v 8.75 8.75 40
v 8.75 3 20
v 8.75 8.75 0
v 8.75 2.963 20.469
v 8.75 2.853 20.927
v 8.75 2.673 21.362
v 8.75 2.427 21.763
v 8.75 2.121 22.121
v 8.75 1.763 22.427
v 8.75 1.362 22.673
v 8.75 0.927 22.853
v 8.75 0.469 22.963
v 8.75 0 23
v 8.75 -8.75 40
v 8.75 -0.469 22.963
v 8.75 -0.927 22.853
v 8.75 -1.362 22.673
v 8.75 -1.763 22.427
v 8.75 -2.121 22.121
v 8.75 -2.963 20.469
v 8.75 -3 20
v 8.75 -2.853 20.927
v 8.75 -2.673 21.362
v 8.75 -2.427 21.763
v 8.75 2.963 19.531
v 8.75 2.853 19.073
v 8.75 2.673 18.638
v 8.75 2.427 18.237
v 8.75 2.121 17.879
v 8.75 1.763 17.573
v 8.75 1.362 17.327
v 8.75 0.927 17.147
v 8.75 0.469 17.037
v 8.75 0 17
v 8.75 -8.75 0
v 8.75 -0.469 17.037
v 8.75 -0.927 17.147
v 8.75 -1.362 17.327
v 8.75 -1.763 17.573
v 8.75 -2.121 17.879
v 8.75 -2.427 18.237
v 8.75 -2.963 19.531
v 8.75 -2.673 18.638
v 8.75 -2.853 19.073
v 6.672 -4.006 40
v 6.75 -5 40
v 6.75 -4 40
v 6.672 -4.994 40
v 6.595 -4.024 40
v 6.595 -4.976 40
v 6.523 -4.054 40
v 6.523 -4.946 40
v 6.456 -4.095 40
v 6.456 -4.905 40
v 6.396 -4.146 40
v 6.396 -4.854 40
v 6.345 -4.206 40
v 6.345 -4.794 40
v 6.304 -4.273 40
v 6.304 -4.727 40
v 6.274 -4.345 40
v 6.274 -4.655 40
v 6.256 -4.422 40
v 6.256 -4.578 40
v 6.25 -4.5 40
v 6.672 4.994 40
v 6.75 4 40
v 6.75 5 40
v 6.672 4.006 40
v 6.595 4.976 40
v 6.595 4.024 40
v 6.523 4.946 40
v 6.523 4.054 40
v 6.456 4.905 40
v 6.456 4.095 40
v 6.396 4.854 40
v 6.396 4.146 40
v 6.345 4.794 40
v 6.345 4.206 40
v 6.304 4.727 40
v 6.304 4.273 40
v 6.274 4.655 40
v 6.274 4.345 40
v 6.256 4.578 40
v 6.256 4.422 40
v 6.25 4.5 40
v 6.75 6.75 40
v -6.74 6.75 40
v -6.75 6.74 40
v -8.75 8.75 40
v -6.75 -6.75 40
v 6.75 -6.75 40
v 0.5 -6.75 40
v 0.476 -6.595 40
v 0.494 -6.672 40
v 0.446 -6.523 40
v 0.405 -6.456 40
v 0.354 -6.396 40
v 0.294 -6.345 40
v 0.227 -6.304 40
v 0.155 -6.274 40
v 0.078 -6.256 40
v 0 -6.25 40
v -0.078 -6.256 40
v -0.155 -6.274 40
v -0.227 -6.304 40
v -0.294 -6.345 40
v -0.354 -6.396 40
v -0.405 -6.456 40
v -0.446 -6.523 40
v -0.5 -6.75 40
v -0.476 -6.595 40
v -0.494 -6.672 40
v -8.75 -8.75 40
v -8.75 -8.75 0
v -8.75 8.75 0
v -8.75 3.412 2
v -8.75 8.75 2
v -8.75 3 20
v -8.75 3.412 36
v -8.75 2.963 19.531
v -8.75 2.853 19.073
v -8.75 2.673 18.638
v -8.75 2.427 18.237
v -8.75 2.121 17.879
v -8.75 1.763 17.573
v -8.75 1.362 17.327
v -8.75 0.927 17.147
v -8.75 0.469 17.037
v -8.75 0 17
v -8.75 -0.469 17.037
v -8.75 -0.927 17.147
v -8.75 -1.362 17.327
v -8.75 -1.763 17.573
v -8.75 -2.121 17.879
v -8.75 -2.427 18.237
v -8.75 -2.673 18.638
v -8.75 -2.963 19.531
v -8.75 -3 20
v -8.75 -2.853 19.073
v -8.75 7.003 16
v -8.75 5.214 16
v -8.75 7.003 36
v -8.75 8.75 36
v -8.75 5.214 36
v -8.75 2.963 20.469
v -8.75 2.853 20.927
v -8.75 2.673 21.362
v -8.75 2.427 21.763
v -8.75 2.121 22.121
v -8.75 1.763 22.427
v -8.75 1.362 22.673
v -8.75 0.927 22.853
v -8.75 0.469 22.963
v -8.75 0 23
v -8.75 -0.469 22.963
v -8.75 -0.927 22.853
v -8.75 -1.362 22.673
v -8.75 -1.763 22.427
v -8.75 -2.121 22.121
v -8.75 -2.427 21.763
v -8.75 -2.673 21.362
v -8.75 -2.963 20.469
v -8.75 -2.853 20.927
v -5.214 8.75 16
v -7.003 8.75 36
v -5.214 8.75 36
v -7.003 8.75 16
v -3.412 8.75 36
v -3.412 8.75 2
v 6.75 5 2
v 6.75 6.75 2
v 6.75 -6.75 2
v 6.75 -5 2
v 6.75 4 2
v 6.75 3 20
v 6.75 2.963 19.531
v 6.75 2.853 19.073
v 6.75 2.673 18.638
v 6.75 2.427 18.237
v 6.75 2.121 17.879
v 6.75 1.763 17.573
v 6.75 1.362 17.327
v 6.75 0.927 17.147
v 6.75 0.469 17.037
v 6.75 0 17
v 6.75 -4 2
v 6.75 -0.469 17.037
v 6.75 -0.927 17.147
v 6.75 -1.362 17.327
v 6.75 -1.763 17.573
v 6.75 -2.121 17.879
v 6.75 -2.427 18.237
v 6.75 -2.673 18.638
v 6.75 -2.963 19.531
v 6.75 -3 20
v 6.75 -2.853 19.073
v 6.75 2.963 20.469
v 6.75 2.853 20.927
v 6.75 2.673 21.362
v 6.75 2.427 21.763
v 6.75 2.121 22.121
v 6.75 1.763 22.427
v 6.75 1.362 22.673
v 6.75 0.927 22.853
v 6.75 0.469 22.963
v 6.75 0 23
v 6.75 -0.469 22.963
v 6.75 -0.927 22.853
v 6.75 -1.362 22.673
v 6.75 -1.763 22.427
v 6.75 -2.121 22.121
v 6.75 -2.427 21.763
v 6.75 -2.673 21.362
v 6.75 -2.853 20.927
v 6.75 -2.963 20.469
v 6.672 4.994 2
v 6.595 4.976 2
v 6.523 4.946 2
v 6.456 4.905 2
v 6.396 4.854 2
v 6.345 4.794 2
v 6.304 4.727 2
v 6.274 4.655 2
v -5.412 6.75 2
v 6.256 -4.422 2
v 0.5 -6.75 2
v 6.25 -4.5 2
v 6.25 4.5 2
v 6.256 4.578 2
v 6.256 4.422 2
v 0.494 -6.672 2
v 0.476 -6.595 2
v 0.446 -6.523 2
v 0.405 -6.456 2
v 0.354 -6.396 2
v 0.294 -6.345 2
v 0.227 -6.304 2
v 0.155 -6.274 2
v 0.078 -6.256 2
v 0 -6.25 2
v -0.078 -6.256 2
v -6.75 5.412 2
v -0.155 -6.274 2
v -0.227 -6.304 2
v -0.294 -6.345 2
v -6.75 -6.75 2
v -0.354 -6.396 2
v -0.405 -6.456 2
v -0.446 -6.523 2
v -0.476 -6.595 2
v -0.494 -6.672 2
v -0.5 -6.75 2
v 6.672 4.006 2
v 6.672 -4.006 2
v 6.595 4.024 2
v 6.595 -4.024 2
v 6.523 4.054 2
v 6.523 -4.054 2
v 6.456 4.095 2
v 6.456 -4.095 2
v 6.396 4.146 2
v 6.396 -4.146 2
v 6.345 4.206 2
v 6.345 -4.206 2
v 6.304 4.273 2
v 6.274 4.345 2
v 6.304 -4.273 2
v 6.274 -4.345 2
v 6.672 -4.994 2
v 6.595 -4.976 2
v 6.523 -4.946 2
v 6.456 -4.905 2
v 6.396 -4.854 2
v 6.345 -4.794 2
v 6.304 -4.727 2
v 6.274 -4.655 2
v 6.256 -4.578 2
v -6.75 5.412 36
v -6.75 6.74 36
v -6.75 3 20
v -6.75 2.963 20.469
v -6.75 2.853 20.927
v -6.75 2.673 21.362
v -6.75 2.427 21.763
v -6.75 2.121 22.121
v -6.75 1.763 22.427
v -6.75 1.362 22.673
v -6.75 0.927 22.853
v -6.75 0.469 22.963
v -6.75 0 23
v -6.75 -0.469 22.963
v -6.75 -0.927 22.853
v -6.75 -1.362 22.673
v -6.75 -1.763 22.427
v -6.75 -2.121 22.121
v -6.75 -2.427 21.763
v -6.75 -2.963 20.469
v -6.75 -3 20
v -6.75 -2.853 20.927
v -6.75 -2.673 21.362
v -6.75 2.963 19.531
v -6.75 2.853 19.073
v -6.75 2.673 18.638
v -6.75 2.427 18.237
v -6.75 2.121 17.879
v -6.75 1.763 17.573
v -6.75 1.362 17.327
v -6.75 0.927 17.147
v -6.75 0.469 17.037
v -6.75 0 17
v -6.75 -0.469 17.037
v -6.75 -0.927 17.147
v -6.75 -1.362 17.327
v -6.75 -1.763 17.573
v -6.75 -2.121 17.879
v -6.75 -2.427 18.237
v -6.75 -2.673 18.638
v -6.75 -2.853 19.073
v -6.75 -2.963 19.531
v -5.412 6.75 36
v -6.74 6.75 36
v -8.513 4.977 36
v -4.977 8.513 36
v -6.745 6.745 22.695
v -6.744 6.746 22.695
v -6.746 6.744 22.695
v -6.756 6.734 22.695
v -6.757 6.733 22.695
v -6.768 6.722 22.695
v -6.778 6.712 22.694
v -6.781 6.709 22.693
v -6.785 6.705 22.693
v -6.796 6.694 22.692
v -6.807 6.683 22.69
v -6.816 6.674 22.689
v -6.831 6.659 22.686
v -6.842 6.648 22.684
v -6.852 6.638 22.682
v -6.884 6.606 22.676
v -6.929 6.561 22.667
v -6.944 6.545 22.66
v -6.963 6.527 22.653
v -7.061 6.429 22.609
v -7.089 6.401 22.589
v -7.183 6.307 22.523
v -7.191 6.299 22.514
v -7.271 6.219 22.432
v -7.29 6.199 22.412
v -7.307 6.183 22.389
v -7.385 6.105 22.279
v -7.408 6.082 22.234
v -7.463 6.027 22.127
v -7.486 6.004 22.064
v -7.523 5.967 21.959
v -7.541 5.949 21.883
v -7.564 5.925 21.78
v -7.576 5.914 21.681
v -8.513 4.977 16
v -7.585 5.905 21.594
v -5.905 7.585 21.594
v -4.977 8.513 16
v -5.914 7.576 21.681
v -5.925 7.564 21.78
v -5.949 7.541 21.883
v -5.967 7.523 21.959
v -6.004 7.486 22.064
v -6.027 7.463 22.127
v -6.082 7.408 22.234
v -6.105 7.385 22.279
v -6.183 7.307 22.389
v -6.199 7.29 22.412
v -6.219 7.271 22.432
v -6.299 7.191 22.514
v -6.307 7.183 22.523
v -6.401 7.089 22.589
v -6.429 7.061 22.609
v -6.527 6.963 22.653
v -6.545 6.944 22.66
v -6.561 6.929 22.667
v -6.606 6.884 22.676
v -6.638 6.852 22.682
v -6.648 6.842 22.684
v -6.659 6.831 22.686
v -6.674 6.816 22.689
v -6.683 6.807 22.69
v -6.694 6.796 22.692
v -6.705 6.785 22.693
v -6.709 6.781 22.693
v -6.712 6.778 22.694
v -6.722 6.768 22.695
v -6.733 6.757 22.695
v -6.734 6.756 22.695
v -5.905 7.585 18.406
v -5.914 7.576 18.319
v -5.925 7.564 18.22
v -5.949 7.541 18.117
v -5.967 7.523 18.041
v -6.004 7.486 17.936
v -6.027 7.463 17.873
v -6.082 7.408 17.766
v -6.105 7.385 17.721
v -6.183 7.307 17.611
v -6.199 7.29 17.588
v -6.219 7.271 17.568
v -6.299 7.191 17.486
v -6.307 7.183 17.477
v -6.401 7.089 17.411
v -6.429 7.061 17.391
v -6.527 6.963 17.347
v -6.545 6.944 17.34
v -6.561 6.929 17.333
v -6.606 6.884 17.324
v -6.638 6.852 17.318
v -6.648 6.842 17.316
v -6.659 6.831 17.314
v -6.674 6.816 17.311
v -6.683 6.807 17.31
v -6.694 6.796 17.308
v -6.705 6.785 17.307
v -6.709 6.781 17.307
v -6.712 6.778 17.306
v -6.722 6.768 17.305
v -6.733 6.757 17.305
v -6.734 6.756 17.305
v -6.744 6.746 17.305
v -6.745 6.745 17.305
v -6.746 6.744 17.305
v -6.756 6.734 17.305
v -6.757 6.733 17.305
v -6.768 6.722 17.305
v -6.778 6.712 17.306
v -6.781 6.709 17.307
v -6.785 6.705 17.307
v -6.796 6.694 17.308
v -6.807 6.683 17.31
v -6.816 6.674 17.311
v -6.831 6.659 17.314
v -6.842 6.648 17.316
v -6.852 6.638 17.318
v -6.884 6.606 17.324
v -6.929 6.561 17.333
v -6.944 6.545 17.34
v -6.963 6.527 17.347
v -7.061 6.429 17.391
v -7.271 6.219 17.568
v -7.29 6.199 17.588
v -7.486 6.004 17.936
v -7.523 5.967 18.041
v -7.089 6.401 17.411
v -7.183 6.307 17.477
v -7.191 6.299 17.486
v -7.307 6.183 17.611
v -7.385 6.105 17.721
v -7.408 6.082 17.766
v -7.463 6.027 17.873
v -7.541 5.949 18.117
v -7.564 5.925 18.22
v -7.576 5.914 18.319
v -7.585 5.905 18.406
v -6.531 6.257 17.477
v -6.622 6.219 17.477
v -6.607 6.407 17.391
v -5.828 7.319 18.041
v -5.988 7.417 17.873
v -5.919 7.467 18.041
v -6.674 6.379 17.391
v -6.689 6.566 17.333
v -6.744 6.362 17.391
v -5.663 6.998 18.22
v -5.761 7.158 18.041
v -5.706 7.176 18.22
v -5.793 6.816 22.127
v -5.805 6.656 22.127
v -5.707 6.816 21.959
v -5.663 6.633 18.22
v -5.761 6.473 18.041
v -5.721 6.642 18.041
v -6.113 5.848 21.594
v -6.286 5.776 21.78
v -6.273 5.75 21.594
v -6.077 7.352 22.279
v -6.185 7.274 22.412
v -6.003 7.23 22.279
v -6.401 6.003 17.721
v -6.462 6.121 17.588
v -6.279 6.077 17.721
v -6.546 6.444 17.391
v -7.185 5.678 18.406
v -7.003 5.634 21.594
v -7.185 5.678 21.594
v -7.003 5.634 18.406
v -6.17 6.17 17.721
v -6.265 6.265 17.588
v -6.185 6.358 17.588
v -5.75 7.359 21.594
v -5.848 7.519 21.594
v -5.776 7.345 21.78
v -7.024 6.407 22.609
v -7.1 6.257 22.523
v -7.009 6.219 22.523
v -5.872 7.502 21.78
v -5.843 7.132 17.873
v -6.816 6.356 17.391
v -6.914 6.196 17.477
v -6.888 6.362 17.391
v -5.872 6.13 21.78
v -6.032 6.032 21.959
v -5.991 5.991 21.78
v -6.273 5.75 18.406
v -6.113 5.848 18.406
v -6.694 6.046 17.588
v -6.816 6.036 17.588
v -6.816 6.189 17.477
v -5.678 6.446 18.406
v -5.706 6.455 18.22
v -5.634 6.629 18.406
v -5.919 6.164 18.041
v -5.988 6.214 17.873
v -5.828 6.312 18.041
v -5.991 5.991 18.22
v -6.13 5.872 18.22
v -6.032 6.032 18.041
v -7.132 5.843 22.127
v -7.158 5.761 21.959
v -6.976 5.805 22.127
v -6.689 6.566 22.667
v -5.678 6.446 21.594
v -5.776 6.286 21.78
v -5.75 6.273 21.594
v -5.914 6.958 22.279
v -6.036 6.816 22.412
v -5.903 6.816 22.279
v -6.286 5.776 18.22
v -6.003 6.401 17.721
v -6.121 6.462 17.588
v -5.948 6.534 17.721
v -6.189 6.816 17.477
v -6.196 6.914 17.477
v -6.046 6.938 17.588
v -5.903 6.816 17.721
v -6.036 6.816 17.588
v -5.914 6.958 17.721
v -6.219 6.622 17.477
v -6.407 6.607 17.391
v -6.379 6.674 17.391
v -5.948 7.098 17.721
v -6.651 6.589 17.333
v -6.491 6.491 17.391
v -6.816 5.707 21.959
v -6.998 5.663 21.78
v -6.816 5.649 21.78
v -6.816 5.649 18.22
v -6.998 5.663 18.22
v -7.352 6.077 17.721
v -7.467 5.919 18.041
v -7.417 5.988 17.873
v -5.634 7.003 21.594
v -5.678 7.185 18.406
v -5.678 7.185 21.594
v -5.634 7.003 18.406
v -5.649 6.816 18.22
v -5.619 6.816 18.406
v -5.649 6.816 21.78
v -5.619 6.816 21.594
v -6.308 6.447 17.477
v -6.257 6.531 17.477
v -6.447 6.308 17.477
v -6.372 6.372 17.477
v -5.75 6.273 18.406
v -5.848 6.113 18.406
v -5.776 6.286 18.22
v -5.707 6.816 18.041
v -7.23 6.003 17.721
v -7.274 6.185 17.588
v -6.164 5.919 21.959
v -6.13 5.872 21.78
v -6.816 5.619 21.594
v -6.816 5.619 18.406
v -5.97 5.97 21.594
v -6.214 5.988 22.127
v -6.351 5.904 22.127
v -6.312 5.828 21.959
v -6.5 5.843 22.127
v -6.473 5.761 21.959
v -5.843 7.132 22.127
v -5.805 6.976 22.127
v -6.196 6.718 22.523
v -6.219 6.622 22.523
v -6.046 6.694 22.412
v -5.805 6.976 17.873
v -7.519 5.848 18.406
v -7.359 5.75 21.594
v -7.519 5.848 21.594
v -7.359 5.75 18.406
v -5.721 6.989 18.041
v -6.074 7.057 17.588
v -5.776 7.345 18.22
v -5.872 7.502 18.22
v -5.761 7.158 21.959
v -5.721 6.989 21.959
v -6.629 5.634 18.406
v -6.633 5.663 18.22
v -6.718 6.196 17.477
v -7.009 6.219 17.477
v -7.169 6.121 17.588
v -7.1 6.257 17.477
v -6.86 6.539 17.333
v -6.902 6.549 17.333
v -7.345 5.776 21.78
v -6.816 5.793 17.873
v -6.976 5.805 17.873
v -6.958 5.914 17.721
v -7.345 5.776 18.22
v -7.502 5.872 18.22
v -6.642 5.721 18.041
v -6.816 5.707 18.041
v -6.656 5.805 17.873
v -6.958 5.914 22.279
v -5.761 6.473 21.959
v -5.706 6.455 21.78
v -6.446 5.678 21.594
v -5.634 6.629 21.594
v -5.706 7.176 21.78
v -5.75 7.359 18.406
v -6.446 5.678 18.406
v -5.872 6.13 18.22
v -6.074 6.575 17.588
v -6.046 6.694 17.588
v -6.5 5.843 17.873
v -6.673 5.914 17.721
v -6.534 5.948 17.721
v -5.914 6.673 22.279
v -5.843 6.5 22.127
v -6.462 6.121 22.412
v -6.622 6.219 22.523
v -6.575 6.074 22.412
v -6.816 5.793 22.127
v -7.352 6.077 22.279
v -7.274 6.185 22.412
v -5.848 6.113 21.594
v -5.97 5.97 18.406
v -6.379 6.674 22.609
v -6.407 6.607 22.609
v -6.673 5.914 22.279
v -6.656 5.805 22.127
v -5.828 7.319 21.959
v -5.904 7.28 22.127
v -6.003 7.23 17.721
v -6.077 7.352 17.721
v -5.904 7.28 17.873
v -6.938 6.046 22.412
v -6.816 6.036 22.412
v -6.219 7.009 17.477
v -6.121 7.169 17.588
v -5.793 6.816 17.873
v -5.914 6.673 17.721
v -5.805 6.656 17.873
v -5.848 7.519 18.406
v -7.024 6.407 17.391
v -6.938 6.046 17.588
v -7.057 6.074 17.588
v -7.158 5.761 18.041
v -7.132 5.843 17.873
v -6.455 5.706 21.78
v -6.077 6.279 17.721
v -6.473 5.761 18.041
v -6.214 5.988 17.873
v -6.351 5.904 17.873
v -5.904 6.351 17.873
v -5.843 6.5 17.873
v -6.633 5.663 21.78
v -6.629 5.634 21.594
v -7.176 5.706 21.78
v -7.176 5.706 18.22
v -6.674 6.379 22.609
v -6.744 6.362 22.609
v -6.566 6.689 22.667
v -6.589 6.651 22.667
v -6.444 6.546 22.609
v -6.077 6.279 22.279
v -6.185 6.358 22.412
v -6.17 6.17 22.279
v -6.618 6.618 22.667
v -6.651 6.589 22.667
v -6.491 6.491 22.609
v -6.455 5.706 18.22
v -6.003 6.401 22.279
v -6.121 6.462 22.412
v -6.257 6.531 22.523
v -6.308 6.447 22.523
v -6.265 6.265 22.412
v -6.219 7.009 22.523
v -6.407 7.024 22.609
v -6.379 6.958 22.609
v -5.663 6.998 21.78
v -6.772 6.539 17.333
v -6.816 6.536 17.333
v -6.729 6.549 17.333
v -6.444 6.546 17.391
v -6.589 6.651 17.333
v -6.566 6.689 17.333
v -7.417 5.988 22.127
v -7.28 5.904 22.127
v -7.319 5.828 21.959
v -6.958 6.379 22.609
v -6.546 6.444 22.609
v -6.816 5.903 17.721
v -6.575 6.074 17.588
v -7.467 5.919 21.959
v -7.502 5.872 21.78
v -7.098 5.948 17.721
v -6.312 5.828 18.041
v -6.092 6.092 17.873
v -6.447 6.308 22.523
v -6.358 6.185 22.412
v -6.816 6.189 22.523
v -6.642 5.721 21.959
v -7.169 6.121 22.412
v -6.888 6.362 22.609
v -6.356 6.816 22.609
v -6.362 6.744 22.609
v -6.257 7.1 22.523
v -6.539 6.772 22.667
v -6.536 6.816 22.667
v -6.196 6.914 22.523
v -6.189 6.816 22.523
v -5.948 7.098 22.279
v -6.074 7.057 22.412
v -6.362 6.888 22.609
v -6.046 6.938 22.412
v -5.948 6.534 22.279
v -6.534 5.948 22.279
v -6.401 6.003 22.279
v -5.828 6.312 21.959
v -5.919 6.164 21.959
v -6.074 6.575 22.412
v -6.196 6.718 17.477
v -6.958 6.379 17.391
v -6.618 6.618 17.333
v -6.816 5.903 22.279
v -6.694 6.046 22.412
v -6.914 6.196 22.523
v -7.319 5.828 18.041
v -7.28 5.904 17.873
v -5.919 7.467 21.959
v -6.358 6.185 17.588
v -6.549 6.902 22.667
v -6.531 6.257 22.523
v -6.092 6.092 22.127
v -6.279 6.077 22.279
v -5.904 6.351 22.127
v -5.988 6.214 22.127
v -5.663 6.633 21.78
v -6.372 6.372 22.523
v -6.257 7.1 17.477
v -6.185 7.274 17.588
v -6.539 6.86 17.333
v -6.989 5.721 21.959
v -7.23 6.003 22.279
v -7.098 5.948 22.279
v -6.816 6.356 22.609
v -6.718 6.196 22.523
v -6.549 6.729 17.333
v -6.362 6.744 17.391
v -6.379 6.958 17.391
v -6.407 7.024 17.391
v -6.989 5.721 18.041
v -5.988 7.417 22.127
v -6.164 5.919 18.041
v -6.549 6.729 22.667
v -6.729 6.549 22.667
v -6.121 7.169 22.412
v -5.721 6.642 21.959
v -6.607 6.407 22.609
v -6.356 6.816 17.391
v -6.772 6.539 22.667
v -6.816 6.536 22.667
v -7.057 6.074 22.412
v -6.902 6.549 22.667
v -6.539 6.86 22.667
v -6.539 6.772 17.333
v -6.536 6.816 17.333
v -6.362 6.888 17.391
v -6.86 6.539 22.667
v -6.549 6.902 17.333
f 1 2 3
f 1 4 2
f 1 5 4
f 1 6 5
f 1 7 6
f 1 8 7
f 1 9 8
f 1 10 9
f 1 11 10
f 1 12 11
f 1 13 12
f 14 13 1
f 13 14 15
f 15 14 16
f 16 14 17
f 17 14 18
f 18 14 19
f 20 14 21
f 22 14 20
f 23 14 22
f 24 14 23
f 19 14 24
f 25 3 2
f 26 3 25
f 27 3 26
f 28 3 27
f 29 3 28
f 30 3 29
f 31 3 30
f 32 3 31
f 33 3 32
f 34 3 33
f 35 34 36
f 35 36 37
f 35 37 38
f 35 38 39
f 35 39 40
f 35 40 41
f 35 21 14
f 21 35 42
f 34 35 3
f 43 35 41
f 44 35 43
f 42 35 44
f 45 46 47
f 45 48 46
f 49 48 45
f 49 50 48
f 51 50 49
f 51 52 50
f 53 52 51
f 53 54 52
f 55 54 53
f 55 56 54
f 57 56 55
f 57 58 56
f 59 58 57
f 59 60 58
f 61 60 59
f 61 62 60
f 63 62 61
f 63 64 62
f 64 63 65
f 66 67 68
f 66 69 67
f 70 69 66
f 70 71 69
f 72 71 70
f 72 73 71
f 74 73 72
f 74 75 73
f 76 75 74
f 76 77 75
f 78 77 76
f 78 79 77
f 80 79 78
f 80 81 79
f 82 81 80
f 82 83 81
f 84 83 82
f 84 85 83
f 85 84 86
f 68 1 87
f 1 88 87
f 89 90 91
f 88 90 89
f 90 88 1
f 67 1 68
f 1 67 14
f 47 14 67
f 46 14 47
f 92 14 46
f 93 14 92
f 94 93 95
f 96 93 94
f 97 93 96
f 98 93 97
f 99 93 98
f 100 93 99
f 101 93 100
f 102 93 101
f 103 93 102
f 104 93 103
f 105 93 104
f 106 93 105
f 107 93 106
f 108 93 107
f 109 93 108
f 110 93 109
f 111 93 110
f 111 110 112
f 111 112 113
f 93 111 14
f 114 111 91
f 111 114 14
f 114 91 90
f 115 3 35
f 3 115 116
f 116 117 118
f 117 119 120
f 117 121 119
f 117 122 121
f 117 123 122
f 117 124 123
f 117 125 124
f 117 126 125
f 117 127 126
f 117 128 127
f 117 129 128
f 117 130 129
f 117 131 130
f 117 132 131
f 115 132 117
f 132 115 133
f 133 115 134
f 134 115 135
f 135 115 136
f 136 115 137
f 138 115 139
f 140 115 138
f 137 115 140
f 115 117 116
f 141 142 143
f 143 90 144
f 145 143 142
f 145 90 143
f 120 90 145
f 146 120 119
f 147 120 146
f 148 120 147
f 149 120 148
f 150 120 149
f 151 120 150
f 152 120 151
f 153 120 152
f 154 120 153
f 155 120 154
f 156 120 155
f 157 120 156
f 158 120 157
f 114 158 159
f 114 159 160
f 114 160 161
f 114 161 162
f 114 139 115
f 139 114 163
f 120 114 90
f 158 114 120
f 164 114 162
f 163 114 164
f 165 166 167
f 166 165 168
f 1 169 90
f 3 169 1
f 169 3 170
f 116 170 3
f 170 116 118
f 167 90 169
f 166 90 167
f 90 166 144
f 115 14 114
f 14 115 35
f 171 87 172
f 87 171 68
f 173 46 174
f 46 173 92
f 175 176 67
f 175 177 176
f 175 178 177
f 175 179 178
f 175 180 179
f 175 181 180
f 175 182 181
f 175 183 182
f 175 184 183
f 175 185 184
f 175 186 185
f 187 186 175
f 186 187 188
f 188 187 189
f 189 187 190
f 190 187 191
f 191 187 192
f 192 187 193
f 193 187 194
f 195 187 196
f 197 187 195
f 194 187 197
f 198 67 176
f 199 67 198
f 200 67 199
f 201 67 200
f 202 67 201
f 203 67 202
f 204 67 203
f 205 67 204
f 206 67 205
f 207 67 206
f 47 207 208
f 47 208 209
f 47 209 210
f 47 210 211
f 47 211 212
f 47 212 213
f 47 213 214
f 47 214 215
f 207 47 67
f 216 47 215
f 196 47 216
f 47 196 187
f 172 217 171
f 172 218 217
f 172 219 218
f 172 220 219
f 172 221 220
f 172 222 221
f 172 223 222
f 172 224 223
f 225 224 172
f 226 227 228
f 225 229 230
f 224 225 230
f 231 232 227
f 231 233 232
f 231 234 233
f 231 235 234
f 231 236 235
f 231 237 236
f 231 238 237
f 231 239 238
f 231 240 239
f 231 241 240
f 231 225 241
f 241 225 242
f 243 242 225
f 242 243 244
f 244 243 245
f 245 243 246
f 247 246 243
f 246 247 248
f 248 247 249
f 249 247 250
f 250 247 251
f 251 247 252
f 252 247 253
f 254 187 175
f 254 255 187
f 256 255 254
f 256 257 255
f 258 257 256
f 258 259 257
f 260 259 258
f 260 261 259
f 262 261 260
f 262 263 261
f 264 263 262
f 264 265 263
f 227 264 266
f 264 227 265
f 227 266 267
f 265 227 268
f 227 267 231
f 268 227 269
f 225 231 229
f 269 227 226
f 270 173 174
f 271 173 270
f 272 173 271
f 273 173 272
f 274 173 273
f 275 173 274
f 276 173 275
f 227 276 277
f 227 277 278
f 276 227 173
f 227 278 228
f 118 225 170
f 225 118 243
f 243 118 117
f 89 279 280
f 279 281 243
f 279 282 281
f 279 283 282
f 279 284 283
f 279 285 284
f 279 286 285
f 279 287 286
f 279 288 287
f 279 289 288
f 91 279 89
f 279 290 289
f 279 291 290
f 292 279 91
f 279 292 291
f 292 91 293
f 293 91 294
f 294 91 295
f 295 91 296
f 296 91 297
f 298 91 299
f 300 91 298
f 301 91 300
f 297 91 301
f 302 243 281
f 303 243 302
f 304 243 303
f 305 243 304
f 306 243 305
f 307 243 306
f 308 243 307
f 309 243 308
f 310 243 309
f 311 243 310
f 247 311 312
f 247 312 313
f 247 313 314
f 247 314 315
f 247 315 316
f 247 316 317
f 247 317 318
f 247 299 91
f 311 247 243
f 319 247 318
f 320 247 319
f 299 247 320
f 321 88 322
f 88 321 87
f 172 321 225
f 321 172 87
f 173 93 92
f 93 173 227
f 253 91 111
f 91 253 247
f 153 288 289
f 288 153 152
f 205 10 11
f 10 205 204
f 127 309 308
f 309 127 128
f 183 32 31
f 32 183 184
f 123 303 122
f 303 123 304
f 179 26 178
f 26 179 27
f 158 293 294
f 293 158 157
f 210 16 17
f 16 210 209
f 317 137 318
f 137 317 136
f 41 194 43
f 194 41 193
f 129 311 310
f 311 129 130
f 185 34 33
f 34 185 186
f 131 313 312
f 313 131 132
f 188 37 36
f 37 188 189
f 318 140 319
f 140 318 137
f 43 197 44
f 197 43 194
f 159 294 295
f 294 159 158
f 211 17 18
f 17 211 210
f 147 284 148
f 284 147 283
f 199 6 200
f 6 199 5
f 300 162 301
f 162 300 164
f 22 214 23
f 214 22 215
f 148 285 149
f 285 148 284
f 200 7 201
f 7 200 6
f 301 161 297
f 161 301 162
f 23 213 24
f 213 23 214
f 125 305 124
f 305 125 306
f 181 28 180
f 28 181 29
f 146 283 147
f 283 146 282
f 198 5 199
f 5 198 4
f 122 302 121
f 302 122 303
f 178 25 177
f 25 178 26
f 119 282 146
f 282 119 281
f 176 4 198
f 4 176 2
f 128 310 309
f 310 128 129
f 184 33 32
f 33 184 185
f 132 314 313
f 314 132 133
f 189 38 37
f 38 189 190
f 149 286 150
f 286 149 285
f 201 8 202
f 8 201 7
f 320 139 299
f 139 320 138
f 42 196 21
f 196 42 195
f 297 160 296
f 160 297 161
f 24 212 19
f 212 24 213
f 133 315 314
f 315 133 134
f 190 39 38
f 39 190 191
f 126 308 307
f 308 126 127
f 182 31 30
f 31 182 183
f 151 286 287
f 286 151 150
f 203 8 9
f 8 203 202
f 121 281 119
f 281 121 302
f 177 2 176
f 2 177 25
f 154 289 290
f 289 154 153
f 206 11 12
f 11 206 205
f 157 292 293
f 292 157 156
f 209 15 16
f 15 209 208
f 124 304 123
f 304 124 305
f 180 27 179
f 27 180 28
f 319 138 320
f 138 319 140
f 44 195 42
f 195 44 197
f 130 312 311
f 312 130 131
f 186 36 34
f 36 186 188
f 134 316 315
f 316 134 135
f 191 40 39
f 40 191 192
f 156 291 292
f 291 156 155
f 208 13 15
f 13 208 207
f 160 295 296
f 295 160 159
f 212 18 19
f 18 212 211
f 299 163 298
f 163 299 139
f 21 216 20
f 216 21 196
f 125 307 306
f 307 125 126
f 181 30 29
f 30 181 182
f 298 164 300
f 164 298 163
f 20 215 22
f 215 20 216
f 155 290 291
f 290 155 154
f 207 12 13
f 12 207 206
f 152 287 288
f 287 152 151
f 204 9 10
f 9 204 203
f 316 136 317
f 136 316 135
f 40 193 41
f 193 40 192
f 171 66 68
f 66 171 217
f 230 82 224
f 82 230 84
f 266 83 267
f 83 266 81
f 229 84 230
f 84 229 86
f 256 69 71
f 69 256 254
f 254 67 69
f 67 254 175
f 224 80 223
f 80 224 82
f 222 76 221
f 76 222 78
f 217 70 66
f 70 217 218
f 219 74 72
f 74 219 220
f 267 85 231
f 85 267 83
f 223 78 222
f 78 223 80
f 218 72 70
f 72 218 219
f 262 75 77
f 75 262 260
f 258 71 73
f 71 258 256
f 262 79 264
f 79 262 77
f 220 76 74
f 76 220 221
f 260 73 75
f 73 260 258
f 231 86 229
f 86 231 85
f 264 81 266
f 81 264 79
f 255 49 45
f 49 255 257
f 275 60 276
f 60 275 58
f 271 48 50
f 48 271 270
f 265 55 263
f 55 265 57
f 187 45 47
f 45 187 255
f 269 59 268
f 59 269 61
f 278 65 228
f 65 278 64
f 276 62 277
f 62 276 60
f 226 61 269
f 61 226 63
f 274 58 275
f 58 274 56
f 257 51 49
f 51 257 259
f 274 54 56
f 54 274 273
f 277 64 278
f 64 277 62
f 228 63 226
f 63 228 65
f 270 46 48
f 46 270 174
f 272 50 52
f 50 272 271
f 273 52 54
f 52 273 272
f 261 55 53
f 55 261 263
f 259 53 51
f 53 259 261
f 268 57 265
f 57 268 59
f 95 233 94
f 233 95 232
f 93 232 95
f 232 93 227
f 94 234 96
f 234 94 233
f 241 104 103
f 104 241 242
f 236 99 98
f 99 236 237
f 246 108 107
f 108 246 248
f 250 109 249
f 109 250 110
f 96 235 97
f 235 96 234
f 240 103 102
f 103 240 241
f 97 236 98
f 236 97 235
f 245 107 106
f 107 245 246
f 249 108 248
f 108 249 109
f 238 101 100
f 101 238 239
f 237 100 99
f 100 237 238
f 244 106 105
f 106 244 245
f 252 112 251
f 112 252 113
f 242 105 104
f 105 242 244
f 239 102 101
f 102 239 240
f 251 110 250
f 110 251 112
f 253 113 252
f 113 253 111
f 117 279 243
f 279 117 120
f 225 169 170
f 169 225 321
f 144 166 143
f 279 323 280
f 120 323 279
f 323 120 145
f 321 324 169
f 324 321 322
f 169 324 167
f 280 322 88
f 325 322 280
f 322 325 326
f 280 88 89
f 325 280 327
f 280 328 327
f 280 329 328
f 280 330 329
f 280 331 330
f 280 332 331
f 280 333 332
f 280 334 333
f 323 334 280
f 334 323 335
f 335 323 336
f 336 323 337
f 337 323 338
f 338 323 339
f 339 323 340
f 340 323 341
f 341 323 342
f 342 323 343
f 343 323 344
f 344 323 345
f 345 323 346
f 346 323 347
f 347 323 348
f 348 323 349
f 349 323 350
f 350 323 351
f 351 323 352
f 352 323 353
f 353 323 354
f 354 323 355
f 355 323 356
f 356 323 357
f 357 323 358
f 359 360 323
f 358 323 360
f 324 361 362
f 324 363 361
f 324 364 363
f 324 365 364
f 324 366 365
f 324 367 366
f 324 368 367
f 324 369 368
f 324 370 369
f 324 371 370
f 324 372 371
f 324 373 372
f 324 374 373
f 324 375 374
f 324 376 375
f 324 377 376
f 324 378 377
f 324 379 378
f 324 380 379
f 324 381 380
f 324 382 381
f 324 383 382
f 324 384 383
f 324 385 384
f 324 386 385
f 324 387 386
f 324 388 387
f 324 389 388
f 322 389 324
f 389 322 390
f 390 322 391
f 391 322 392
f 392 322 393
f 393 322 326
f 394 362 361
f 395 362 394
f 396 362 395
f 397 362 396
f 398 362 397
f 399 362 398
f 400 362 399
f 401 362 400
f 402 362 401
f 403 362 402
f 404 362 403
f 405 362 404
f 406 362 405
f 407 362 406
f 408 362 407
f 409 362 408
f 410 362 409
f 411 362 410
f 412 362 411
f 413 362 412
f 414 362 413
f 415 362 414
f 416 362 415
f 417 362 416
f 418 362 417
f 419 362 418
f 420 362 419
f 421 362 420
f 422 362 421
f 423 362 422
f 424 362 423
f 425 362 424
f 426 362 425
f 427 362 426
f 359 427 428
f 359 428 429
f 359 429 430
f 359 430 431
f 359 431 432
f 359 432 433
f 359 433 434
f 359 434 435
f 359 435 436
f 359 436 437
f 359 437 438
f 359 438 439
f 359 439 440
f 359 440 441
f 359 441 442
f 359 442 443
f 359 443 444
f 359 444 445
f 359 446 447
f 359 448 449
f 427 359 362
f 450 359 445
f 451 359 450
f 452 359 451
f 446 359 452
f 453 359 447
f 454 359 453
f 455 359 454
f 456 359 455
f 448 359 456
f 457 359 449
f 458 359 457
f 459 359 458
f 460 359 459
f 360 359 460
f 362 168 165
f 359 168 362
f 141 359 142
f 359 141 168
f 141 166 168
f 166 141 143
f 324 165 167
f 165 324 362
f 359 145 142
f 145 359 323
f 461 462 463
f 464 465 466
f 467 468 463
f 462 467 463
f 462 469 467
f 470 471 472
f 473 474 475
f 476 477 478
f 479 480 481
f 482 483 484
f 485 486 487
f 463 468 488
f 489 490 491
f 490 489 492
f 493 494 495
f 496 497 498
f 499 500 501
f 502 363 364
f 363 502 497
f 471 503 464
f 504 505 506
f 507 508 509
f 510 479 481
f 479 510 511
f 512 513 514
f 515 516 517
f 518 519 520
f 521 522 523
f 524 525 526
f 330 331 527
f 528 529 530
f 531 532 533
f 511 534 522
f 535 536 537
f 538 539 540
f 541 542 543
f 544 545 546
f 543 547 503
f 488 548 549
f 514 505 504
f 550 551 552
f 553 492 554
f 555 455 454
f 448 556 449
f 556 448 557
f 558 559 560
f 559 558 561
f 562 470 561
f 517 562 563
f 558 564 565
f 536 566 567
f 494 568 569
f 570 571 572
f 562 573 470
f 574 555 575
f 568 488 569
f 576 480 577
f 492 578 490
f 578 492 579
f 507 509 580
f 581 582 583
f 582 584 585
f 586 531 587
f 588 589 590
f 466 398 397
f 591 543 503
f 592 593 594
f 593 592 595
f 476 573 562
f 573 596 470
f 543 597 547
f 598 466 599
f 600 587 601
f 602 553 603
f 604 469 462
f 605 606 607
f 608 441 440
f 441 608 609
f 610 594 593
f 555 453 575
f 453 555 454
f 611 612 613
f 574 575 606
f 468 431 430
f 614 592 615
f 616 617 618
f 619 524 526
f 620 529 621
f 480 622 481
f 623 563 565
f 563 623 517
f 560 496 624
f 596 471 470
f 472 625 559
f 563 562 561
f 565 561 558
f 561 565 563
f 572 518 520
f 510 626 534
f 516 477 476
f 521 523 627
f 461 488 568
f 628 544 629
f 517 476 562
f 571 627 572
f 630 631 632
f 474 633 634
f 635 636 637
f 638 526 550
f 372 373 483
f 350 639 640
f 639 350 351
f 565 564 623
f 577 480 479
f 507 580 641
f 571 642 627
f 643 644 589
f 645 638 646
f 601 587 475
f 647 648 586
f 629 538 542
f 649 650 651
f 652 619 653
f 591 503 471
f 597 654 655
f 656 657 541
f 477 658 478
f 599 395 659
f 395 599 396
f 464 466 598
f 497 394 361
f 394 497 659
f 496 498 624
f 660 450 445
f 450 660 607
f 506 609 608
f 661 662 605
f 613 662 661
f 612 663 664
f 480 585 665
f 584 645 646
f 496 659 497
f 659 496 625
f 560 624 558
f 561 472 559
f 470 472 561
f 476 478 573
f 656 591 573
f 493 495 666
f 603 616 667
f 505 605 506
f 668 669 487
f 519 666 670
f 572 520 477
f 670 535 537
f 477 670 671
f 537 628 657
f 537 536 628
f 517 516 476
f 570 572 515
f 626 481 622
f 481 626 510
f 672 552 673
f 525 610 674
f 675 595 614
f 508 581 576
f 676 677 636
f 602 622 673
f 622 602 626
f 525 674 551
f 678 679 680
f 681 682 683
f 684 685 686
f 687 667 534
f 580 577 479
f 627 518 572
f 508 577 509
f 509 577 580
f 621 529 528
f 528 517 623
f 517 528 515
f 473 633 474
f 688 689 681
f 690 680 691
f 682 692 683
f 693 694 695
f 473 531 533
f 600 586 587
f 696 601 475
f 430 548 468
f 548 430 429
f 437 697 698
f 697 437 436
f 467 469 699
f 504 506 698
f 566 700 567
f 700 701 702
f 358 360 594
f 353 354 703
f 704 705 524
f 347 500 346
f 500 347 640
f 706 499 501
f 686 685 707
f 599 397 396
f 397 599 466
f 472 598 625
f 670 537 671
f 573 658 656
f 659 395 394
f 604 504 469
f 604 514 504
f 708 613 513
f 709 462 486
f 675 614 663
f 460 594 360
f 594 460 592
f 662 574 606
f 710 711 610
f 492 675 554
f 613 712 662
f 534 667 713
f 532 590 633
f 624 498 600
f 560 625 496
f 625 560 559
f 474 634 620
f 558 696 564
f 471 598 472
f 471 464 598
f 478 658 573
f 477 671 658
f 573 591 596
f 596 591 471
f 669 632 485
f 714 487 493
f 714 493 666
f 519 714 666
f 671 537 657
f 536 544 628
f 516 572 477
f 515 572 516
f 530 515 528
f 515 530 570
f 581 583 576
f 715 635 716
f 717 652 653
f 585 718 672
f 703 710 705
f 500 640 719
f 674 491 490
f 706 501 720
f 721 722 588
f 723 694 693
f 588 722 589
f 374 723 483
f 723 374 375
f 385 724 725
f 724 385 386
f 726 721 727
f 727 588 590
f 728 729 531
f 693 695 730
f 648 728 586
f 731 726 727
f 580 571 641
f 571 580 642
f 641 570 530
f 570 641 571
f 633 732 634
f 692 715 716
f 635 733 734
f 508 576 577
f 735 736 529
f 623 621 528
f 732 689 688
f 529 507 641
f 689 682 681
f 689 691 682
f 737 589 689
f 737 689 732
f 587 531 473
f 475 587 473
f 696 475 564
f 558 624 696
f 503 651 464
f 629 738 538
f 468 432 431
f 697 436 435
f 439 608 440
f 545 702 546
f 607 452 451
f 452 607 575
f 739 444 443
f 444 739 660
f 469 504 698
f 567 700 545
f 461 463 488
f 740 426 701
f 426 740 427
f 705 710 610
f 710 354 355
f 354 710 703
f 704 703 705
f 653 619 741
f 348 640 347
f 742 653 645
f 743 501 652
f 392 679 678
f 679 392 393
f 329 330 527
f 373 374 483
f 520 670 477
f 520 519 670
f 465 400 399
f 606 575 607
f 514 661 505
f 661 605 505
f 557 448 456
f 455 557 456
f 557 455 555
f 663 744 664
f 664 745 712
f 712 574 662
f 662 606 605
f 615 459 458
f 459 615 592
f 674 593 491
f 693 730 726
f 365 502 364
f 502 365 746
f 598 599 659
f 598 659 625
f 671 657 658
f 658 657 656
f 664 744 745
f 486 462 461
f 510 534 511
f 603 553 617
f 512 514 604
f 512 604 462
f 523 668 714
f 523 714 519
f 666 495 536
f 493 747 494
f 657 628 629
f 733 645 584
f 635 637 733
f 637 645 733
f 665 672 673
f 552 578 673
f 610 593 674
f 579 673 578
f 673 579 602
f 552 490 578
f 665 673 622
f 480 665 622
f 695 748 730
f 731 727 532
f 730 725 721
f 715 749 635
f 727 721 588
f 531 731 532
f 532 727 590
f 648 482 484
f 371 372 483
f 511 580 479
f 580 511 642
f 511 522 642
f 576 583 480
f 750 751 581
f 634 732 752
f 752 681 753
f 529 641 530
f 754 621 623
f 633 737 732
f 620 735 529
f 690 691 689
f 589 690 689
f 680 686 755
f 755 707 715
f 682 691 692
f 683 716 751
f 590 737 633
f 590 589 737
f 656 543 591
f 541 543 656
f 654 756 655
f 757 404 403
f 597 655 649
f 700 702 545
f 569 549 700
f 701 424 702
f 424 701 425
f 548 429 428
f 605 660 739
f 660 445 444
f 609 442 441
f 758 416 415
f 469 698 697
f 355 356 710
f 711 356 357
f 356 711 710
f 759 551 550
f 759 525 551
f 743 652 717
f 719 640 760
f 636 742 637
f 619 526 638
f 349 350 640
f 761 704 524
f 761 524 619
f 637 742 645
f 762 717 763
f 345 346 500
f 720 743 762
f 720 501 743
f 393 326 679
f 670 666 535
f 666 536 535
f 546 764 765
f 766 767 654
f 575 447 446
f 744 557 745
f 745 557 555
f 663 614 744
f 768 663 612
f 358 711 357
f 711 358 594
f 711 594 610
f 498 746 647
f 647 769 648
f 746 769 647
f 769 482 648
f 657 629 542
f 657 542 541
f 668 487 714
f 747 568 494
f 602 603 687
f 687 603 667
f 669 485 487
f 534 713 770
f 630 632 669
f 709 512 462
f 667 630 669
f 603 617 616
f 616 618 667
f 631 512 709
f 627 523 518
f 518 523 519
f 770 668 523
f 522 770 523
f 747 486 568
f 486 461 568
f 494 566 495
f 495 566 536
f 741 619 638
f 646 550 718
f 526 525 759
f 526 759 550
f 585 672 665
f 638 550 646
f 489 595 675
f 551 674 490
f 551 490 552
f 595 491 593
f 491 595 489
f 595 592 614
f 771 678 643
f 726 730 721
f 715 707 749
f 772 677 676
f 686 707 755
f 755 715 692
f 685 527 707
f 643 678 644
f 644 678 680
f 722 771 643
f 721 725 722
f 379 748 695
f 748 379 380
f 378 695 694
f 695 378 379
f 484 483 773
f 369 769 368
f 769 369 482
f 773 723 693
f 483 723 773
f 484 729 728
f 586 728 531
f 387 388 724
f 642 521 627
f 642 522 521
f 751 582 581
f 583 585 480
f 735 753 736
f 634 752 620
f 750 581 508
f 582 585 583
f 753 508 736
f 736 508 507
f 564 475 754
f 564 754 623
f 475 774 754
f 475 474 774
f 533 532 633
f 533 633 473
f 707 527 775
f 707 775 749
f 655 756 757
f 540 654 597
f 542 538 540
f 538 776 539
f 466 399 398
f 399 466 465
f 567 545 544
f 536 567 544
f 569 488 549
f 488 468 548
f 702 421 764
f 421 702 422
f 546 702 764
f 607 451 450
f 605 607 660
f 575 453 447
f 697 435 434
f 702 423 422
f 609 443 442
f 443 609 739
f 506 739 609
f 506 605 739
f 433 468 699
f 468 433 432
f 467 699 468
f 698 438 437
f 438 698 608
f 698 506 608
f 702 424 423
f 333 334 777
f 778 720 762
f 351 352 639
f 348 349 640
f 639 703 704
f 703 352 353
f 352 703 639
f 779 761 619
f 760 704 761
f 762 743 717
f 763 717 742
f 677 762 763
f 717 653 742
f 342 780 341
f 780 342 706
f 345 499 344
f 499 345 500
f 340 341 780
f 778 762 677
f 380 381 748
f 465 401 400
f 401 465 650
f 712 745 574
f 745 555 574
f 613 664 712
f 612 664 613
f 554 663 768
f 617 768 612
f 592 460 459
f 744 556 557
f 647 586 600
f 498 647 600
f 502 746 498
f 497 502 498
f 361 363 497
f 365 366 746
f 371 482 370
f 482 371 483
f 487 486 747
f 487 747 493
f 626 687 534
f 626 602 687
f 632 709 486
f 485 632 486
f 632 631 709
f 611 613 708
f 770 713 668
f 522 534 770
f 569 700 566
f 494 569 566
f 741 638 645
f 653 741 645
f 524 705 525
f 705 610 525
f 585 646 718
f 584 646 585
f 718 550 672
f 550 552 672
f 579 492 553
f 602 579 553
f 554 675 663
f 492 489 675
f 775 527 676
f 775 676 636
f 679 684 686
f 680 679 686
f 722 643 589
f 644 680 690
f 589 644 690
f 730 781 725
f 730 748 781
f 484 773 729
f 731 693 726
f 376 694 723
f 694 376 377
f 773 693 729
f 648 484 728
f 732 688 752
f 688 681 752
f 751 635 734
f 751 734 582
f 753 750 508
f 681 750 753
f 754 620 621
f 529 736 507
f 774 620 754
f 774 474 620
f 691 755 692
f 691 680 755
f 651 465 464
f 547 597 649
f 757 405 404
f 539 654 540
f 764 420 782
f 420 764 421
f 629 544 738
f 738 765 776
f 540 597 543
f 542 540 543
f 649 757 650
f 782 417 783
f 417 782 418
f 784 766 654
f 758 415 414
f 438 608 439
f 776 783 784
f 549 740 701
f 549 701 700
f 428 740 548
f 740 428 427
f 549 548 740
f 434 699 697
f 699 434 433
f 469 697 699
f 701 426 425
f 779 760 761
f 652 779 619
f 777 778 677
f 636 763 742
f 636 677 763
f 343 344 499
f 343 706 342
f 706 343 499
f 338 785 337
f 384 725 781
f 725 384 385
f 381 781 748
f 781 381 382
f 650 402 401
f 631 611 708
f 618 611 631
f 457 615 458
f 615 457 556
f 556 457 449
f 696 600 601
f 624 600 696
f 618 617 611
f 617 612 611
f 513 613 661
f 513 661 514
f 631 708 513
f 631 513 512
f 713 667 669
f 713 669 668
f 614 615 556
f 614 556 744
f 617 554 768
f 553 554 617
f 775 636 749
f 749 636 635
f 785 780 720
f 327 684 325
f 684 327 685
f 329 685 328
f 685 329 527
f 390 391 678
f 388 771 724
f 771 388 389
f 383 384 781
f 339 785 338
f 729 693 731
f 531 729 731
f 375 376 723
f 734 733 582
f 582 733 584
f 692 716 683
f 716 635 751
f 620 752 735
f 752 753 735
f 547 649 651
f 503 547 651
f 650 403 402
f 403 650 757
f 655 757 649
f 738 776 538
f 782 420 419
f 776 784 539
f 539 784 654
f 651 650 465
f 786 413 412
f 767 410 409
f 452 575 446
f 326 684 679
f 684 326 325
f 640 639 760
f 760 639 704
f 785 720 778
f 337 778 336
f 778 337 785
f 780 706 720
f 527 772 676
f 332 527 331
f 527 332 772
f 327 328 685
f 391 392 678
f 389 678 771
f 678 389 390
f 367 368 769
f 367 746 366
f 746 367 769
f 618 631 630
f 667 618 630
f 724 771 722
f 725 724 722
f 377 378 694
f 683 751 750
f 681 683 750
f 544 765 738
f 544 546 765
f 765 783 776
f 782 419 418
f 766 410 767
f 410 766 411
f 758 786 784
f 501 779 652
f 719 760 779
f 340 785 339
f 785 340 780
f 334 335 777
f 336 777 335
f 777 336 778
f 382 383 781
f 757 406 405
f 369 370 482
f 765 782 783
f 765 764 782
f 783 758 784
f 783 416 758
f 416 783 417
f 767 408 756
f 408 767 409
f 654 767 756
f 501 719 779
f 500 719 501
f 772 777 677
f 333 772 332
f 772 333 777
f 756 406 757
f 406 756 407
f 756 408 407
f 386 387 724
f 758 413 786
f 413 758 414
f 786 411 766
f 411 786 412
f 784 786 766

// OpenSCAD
// holder2.scad -- cuvette holder with a springy corner clip
//
// The open corner from holder.scad is replaced by a flexible tongue that is
// anchored at the TOP of the holder (the corner stays solid above
// clip_root_z) and hangs down the -x/+y corner at 45 degrees.  A rounded nub
// near the tongue's free end protrudes clip_preload past the seated cuvette
// corner, so it presses the cuvette diagonally into the three registration
// rods (two on the +x wall, one on the -y wall) -- same seat every insertion.
//
// Print note: printed upright as modeled, the tongue's free end (z=clip_tip_z)
// starts over the open notch, so enable supports (they pull out of the open
// corner easily).  Tune spring force with clip_thick (stiffness ~ t^3) and
// clip_preload.

$fn = 40;

window_diam   = 6;
window_height = 15;

cuvette_dim  = 12.5;
rod_radius   = 0.5;
holder_side  = cuvette_dim + rod_radius*2;
holder_depth = 40;
wall_width   = 2;
outer_side   = holder_side + wall_width*2;

/* ---------- spring clip parameters ---------- */
clip_thick   = 1.6;   // tongue thickness
clip_width   = 5;     // tongue width across the corner
clip_gap     = 0.7;   // clearance from tongue face to seated cuvette corner
clip_preload = 0.4;   // nub interference with the seated cuvette corner
clip_root_z  = 36;    // corner stays solid above this; tongue anchors into it
clip_tip_z   = 16;    // height of the tongue's free end
nub_r        = 1.2;   // radius of the rounded nub ridge
nub_len      = 3;     // vertical length of the nub ridge
nub_z        = holder_depth/2;  // press right at the optical window height
notch_d      = 8.6;   // corner material beyond this diagonal distance is cleared

// distances measured diagonally outward from the cavity center to the -x/+y corner
d_cuvette = cuvette_dim/2 * sqrt(2);   // seated cuvette corner edge   (~8.84)
d_face    = d_cuvette + clip_gap;      // inner face of the tongue
d_nub_tip = d_cuvette - clip_preload;  // nub tip, inside the cuvette line by the preload

// place children at diagonal distance d up the -x/+y corner;
// local +x points back toward the cavity center, local y runs along the corner face
module at_corner(d=0, z=0) {
    translate([-d/sqrt(2), d/sqrt(2), z])
        rotate([0,0,-45])
            children();
}

/* ---------- body (walls, floor, window, registration rods) ---------- */
module body() {
    translate([0,0,holder_depth/2]) {
        difference() {
            cube([outer_side, outer_side, holder_depth], center=true);

            // inner cavity
            translate([0,0,wall_width])
                cube([holder_side, holder_side, holder_depth], center=true);

            // optical window
            rotate([0,90,0])
                cylinder(h=holder_side*2, r=window_diam/2, center=true);
        }

        // two registration rods along y on the +x side
        translate([cuvette_dim/2+rod_radius, holder_side/3, 0])
            cylinder(h=holder_depth, r=rod_radius, center=true);
        translate([cuvette_dim/2+rod_radius, -holder_side/3, 0])
            cylinder(h=holder_depth, r=rod_radius, center=true);

        // one registration rod on the -y side
        translate([0, -cuvette_dim/2-rod_radius, 0])
            cylinder(h=holder_depth, r=rod_radius, center=true);
    }
}

/* ---------- corner notch: clears the corner so the tongue can flex ---------- */
// removes everything beyond notch_d at the corner, from the floor up to
// clip_root_z; above that the corner stays solid to anchor the tongue
module corner_notch() {
    at_corner(notch_d, wall_width)
        translate([-outer_side, -outer_side, 0])
            cube([outer_side, outer_side*2, clip_root_z - wall_width]);
}

/* ---------- the springy tongue with its nub ---------- */
module tongue() {
    // flat 45-degree tongue, running from its free end up past clip_root_z
    // so it fuses into the solid corner block at the top
    at_corner(d_face)
        translate([-clip_thick, -clip_width/2, clip_tip_z])
            cube([clip_thick, clip_width, holder_depth - clip_tip_z]);

    // rounded vertical nub ridge on the inner face; its tip sits clip_preload
    // past the seated cuvette corner, and its round profile gives a ramp for
    // insertion and removal
    at_corner(d_nub_tip + nub_r)
        hull() {
            translate([0, 0, nub_z - nub_len/2]) sphere(r=nub_r);
            translate([0, 0, nub_z + nub_len/2]) sphere(r=nub_r);
        }
}

/* ---------- assembly ---------- */
module holder2() {
    intersection() {
        union() {
            difference() {
                body();
                corner_notch();
            }
            tongue();
        }
        // trim everything back to the holder's footprint
        translate([0,0,holder_depth/2])
            cube([outer_side, outer_side, holder_depth], center=true);
    }
}

// ghost cuvette in its seated position (against the rods), for fit checking
module cuvette() {
    %translate([-cuvette_dim/2, -cuvette_dim/2, wall_width])
        cube([cuvette_dim, cuvette_dim, holder_depth]);
}

holder2();
//cuvette();
